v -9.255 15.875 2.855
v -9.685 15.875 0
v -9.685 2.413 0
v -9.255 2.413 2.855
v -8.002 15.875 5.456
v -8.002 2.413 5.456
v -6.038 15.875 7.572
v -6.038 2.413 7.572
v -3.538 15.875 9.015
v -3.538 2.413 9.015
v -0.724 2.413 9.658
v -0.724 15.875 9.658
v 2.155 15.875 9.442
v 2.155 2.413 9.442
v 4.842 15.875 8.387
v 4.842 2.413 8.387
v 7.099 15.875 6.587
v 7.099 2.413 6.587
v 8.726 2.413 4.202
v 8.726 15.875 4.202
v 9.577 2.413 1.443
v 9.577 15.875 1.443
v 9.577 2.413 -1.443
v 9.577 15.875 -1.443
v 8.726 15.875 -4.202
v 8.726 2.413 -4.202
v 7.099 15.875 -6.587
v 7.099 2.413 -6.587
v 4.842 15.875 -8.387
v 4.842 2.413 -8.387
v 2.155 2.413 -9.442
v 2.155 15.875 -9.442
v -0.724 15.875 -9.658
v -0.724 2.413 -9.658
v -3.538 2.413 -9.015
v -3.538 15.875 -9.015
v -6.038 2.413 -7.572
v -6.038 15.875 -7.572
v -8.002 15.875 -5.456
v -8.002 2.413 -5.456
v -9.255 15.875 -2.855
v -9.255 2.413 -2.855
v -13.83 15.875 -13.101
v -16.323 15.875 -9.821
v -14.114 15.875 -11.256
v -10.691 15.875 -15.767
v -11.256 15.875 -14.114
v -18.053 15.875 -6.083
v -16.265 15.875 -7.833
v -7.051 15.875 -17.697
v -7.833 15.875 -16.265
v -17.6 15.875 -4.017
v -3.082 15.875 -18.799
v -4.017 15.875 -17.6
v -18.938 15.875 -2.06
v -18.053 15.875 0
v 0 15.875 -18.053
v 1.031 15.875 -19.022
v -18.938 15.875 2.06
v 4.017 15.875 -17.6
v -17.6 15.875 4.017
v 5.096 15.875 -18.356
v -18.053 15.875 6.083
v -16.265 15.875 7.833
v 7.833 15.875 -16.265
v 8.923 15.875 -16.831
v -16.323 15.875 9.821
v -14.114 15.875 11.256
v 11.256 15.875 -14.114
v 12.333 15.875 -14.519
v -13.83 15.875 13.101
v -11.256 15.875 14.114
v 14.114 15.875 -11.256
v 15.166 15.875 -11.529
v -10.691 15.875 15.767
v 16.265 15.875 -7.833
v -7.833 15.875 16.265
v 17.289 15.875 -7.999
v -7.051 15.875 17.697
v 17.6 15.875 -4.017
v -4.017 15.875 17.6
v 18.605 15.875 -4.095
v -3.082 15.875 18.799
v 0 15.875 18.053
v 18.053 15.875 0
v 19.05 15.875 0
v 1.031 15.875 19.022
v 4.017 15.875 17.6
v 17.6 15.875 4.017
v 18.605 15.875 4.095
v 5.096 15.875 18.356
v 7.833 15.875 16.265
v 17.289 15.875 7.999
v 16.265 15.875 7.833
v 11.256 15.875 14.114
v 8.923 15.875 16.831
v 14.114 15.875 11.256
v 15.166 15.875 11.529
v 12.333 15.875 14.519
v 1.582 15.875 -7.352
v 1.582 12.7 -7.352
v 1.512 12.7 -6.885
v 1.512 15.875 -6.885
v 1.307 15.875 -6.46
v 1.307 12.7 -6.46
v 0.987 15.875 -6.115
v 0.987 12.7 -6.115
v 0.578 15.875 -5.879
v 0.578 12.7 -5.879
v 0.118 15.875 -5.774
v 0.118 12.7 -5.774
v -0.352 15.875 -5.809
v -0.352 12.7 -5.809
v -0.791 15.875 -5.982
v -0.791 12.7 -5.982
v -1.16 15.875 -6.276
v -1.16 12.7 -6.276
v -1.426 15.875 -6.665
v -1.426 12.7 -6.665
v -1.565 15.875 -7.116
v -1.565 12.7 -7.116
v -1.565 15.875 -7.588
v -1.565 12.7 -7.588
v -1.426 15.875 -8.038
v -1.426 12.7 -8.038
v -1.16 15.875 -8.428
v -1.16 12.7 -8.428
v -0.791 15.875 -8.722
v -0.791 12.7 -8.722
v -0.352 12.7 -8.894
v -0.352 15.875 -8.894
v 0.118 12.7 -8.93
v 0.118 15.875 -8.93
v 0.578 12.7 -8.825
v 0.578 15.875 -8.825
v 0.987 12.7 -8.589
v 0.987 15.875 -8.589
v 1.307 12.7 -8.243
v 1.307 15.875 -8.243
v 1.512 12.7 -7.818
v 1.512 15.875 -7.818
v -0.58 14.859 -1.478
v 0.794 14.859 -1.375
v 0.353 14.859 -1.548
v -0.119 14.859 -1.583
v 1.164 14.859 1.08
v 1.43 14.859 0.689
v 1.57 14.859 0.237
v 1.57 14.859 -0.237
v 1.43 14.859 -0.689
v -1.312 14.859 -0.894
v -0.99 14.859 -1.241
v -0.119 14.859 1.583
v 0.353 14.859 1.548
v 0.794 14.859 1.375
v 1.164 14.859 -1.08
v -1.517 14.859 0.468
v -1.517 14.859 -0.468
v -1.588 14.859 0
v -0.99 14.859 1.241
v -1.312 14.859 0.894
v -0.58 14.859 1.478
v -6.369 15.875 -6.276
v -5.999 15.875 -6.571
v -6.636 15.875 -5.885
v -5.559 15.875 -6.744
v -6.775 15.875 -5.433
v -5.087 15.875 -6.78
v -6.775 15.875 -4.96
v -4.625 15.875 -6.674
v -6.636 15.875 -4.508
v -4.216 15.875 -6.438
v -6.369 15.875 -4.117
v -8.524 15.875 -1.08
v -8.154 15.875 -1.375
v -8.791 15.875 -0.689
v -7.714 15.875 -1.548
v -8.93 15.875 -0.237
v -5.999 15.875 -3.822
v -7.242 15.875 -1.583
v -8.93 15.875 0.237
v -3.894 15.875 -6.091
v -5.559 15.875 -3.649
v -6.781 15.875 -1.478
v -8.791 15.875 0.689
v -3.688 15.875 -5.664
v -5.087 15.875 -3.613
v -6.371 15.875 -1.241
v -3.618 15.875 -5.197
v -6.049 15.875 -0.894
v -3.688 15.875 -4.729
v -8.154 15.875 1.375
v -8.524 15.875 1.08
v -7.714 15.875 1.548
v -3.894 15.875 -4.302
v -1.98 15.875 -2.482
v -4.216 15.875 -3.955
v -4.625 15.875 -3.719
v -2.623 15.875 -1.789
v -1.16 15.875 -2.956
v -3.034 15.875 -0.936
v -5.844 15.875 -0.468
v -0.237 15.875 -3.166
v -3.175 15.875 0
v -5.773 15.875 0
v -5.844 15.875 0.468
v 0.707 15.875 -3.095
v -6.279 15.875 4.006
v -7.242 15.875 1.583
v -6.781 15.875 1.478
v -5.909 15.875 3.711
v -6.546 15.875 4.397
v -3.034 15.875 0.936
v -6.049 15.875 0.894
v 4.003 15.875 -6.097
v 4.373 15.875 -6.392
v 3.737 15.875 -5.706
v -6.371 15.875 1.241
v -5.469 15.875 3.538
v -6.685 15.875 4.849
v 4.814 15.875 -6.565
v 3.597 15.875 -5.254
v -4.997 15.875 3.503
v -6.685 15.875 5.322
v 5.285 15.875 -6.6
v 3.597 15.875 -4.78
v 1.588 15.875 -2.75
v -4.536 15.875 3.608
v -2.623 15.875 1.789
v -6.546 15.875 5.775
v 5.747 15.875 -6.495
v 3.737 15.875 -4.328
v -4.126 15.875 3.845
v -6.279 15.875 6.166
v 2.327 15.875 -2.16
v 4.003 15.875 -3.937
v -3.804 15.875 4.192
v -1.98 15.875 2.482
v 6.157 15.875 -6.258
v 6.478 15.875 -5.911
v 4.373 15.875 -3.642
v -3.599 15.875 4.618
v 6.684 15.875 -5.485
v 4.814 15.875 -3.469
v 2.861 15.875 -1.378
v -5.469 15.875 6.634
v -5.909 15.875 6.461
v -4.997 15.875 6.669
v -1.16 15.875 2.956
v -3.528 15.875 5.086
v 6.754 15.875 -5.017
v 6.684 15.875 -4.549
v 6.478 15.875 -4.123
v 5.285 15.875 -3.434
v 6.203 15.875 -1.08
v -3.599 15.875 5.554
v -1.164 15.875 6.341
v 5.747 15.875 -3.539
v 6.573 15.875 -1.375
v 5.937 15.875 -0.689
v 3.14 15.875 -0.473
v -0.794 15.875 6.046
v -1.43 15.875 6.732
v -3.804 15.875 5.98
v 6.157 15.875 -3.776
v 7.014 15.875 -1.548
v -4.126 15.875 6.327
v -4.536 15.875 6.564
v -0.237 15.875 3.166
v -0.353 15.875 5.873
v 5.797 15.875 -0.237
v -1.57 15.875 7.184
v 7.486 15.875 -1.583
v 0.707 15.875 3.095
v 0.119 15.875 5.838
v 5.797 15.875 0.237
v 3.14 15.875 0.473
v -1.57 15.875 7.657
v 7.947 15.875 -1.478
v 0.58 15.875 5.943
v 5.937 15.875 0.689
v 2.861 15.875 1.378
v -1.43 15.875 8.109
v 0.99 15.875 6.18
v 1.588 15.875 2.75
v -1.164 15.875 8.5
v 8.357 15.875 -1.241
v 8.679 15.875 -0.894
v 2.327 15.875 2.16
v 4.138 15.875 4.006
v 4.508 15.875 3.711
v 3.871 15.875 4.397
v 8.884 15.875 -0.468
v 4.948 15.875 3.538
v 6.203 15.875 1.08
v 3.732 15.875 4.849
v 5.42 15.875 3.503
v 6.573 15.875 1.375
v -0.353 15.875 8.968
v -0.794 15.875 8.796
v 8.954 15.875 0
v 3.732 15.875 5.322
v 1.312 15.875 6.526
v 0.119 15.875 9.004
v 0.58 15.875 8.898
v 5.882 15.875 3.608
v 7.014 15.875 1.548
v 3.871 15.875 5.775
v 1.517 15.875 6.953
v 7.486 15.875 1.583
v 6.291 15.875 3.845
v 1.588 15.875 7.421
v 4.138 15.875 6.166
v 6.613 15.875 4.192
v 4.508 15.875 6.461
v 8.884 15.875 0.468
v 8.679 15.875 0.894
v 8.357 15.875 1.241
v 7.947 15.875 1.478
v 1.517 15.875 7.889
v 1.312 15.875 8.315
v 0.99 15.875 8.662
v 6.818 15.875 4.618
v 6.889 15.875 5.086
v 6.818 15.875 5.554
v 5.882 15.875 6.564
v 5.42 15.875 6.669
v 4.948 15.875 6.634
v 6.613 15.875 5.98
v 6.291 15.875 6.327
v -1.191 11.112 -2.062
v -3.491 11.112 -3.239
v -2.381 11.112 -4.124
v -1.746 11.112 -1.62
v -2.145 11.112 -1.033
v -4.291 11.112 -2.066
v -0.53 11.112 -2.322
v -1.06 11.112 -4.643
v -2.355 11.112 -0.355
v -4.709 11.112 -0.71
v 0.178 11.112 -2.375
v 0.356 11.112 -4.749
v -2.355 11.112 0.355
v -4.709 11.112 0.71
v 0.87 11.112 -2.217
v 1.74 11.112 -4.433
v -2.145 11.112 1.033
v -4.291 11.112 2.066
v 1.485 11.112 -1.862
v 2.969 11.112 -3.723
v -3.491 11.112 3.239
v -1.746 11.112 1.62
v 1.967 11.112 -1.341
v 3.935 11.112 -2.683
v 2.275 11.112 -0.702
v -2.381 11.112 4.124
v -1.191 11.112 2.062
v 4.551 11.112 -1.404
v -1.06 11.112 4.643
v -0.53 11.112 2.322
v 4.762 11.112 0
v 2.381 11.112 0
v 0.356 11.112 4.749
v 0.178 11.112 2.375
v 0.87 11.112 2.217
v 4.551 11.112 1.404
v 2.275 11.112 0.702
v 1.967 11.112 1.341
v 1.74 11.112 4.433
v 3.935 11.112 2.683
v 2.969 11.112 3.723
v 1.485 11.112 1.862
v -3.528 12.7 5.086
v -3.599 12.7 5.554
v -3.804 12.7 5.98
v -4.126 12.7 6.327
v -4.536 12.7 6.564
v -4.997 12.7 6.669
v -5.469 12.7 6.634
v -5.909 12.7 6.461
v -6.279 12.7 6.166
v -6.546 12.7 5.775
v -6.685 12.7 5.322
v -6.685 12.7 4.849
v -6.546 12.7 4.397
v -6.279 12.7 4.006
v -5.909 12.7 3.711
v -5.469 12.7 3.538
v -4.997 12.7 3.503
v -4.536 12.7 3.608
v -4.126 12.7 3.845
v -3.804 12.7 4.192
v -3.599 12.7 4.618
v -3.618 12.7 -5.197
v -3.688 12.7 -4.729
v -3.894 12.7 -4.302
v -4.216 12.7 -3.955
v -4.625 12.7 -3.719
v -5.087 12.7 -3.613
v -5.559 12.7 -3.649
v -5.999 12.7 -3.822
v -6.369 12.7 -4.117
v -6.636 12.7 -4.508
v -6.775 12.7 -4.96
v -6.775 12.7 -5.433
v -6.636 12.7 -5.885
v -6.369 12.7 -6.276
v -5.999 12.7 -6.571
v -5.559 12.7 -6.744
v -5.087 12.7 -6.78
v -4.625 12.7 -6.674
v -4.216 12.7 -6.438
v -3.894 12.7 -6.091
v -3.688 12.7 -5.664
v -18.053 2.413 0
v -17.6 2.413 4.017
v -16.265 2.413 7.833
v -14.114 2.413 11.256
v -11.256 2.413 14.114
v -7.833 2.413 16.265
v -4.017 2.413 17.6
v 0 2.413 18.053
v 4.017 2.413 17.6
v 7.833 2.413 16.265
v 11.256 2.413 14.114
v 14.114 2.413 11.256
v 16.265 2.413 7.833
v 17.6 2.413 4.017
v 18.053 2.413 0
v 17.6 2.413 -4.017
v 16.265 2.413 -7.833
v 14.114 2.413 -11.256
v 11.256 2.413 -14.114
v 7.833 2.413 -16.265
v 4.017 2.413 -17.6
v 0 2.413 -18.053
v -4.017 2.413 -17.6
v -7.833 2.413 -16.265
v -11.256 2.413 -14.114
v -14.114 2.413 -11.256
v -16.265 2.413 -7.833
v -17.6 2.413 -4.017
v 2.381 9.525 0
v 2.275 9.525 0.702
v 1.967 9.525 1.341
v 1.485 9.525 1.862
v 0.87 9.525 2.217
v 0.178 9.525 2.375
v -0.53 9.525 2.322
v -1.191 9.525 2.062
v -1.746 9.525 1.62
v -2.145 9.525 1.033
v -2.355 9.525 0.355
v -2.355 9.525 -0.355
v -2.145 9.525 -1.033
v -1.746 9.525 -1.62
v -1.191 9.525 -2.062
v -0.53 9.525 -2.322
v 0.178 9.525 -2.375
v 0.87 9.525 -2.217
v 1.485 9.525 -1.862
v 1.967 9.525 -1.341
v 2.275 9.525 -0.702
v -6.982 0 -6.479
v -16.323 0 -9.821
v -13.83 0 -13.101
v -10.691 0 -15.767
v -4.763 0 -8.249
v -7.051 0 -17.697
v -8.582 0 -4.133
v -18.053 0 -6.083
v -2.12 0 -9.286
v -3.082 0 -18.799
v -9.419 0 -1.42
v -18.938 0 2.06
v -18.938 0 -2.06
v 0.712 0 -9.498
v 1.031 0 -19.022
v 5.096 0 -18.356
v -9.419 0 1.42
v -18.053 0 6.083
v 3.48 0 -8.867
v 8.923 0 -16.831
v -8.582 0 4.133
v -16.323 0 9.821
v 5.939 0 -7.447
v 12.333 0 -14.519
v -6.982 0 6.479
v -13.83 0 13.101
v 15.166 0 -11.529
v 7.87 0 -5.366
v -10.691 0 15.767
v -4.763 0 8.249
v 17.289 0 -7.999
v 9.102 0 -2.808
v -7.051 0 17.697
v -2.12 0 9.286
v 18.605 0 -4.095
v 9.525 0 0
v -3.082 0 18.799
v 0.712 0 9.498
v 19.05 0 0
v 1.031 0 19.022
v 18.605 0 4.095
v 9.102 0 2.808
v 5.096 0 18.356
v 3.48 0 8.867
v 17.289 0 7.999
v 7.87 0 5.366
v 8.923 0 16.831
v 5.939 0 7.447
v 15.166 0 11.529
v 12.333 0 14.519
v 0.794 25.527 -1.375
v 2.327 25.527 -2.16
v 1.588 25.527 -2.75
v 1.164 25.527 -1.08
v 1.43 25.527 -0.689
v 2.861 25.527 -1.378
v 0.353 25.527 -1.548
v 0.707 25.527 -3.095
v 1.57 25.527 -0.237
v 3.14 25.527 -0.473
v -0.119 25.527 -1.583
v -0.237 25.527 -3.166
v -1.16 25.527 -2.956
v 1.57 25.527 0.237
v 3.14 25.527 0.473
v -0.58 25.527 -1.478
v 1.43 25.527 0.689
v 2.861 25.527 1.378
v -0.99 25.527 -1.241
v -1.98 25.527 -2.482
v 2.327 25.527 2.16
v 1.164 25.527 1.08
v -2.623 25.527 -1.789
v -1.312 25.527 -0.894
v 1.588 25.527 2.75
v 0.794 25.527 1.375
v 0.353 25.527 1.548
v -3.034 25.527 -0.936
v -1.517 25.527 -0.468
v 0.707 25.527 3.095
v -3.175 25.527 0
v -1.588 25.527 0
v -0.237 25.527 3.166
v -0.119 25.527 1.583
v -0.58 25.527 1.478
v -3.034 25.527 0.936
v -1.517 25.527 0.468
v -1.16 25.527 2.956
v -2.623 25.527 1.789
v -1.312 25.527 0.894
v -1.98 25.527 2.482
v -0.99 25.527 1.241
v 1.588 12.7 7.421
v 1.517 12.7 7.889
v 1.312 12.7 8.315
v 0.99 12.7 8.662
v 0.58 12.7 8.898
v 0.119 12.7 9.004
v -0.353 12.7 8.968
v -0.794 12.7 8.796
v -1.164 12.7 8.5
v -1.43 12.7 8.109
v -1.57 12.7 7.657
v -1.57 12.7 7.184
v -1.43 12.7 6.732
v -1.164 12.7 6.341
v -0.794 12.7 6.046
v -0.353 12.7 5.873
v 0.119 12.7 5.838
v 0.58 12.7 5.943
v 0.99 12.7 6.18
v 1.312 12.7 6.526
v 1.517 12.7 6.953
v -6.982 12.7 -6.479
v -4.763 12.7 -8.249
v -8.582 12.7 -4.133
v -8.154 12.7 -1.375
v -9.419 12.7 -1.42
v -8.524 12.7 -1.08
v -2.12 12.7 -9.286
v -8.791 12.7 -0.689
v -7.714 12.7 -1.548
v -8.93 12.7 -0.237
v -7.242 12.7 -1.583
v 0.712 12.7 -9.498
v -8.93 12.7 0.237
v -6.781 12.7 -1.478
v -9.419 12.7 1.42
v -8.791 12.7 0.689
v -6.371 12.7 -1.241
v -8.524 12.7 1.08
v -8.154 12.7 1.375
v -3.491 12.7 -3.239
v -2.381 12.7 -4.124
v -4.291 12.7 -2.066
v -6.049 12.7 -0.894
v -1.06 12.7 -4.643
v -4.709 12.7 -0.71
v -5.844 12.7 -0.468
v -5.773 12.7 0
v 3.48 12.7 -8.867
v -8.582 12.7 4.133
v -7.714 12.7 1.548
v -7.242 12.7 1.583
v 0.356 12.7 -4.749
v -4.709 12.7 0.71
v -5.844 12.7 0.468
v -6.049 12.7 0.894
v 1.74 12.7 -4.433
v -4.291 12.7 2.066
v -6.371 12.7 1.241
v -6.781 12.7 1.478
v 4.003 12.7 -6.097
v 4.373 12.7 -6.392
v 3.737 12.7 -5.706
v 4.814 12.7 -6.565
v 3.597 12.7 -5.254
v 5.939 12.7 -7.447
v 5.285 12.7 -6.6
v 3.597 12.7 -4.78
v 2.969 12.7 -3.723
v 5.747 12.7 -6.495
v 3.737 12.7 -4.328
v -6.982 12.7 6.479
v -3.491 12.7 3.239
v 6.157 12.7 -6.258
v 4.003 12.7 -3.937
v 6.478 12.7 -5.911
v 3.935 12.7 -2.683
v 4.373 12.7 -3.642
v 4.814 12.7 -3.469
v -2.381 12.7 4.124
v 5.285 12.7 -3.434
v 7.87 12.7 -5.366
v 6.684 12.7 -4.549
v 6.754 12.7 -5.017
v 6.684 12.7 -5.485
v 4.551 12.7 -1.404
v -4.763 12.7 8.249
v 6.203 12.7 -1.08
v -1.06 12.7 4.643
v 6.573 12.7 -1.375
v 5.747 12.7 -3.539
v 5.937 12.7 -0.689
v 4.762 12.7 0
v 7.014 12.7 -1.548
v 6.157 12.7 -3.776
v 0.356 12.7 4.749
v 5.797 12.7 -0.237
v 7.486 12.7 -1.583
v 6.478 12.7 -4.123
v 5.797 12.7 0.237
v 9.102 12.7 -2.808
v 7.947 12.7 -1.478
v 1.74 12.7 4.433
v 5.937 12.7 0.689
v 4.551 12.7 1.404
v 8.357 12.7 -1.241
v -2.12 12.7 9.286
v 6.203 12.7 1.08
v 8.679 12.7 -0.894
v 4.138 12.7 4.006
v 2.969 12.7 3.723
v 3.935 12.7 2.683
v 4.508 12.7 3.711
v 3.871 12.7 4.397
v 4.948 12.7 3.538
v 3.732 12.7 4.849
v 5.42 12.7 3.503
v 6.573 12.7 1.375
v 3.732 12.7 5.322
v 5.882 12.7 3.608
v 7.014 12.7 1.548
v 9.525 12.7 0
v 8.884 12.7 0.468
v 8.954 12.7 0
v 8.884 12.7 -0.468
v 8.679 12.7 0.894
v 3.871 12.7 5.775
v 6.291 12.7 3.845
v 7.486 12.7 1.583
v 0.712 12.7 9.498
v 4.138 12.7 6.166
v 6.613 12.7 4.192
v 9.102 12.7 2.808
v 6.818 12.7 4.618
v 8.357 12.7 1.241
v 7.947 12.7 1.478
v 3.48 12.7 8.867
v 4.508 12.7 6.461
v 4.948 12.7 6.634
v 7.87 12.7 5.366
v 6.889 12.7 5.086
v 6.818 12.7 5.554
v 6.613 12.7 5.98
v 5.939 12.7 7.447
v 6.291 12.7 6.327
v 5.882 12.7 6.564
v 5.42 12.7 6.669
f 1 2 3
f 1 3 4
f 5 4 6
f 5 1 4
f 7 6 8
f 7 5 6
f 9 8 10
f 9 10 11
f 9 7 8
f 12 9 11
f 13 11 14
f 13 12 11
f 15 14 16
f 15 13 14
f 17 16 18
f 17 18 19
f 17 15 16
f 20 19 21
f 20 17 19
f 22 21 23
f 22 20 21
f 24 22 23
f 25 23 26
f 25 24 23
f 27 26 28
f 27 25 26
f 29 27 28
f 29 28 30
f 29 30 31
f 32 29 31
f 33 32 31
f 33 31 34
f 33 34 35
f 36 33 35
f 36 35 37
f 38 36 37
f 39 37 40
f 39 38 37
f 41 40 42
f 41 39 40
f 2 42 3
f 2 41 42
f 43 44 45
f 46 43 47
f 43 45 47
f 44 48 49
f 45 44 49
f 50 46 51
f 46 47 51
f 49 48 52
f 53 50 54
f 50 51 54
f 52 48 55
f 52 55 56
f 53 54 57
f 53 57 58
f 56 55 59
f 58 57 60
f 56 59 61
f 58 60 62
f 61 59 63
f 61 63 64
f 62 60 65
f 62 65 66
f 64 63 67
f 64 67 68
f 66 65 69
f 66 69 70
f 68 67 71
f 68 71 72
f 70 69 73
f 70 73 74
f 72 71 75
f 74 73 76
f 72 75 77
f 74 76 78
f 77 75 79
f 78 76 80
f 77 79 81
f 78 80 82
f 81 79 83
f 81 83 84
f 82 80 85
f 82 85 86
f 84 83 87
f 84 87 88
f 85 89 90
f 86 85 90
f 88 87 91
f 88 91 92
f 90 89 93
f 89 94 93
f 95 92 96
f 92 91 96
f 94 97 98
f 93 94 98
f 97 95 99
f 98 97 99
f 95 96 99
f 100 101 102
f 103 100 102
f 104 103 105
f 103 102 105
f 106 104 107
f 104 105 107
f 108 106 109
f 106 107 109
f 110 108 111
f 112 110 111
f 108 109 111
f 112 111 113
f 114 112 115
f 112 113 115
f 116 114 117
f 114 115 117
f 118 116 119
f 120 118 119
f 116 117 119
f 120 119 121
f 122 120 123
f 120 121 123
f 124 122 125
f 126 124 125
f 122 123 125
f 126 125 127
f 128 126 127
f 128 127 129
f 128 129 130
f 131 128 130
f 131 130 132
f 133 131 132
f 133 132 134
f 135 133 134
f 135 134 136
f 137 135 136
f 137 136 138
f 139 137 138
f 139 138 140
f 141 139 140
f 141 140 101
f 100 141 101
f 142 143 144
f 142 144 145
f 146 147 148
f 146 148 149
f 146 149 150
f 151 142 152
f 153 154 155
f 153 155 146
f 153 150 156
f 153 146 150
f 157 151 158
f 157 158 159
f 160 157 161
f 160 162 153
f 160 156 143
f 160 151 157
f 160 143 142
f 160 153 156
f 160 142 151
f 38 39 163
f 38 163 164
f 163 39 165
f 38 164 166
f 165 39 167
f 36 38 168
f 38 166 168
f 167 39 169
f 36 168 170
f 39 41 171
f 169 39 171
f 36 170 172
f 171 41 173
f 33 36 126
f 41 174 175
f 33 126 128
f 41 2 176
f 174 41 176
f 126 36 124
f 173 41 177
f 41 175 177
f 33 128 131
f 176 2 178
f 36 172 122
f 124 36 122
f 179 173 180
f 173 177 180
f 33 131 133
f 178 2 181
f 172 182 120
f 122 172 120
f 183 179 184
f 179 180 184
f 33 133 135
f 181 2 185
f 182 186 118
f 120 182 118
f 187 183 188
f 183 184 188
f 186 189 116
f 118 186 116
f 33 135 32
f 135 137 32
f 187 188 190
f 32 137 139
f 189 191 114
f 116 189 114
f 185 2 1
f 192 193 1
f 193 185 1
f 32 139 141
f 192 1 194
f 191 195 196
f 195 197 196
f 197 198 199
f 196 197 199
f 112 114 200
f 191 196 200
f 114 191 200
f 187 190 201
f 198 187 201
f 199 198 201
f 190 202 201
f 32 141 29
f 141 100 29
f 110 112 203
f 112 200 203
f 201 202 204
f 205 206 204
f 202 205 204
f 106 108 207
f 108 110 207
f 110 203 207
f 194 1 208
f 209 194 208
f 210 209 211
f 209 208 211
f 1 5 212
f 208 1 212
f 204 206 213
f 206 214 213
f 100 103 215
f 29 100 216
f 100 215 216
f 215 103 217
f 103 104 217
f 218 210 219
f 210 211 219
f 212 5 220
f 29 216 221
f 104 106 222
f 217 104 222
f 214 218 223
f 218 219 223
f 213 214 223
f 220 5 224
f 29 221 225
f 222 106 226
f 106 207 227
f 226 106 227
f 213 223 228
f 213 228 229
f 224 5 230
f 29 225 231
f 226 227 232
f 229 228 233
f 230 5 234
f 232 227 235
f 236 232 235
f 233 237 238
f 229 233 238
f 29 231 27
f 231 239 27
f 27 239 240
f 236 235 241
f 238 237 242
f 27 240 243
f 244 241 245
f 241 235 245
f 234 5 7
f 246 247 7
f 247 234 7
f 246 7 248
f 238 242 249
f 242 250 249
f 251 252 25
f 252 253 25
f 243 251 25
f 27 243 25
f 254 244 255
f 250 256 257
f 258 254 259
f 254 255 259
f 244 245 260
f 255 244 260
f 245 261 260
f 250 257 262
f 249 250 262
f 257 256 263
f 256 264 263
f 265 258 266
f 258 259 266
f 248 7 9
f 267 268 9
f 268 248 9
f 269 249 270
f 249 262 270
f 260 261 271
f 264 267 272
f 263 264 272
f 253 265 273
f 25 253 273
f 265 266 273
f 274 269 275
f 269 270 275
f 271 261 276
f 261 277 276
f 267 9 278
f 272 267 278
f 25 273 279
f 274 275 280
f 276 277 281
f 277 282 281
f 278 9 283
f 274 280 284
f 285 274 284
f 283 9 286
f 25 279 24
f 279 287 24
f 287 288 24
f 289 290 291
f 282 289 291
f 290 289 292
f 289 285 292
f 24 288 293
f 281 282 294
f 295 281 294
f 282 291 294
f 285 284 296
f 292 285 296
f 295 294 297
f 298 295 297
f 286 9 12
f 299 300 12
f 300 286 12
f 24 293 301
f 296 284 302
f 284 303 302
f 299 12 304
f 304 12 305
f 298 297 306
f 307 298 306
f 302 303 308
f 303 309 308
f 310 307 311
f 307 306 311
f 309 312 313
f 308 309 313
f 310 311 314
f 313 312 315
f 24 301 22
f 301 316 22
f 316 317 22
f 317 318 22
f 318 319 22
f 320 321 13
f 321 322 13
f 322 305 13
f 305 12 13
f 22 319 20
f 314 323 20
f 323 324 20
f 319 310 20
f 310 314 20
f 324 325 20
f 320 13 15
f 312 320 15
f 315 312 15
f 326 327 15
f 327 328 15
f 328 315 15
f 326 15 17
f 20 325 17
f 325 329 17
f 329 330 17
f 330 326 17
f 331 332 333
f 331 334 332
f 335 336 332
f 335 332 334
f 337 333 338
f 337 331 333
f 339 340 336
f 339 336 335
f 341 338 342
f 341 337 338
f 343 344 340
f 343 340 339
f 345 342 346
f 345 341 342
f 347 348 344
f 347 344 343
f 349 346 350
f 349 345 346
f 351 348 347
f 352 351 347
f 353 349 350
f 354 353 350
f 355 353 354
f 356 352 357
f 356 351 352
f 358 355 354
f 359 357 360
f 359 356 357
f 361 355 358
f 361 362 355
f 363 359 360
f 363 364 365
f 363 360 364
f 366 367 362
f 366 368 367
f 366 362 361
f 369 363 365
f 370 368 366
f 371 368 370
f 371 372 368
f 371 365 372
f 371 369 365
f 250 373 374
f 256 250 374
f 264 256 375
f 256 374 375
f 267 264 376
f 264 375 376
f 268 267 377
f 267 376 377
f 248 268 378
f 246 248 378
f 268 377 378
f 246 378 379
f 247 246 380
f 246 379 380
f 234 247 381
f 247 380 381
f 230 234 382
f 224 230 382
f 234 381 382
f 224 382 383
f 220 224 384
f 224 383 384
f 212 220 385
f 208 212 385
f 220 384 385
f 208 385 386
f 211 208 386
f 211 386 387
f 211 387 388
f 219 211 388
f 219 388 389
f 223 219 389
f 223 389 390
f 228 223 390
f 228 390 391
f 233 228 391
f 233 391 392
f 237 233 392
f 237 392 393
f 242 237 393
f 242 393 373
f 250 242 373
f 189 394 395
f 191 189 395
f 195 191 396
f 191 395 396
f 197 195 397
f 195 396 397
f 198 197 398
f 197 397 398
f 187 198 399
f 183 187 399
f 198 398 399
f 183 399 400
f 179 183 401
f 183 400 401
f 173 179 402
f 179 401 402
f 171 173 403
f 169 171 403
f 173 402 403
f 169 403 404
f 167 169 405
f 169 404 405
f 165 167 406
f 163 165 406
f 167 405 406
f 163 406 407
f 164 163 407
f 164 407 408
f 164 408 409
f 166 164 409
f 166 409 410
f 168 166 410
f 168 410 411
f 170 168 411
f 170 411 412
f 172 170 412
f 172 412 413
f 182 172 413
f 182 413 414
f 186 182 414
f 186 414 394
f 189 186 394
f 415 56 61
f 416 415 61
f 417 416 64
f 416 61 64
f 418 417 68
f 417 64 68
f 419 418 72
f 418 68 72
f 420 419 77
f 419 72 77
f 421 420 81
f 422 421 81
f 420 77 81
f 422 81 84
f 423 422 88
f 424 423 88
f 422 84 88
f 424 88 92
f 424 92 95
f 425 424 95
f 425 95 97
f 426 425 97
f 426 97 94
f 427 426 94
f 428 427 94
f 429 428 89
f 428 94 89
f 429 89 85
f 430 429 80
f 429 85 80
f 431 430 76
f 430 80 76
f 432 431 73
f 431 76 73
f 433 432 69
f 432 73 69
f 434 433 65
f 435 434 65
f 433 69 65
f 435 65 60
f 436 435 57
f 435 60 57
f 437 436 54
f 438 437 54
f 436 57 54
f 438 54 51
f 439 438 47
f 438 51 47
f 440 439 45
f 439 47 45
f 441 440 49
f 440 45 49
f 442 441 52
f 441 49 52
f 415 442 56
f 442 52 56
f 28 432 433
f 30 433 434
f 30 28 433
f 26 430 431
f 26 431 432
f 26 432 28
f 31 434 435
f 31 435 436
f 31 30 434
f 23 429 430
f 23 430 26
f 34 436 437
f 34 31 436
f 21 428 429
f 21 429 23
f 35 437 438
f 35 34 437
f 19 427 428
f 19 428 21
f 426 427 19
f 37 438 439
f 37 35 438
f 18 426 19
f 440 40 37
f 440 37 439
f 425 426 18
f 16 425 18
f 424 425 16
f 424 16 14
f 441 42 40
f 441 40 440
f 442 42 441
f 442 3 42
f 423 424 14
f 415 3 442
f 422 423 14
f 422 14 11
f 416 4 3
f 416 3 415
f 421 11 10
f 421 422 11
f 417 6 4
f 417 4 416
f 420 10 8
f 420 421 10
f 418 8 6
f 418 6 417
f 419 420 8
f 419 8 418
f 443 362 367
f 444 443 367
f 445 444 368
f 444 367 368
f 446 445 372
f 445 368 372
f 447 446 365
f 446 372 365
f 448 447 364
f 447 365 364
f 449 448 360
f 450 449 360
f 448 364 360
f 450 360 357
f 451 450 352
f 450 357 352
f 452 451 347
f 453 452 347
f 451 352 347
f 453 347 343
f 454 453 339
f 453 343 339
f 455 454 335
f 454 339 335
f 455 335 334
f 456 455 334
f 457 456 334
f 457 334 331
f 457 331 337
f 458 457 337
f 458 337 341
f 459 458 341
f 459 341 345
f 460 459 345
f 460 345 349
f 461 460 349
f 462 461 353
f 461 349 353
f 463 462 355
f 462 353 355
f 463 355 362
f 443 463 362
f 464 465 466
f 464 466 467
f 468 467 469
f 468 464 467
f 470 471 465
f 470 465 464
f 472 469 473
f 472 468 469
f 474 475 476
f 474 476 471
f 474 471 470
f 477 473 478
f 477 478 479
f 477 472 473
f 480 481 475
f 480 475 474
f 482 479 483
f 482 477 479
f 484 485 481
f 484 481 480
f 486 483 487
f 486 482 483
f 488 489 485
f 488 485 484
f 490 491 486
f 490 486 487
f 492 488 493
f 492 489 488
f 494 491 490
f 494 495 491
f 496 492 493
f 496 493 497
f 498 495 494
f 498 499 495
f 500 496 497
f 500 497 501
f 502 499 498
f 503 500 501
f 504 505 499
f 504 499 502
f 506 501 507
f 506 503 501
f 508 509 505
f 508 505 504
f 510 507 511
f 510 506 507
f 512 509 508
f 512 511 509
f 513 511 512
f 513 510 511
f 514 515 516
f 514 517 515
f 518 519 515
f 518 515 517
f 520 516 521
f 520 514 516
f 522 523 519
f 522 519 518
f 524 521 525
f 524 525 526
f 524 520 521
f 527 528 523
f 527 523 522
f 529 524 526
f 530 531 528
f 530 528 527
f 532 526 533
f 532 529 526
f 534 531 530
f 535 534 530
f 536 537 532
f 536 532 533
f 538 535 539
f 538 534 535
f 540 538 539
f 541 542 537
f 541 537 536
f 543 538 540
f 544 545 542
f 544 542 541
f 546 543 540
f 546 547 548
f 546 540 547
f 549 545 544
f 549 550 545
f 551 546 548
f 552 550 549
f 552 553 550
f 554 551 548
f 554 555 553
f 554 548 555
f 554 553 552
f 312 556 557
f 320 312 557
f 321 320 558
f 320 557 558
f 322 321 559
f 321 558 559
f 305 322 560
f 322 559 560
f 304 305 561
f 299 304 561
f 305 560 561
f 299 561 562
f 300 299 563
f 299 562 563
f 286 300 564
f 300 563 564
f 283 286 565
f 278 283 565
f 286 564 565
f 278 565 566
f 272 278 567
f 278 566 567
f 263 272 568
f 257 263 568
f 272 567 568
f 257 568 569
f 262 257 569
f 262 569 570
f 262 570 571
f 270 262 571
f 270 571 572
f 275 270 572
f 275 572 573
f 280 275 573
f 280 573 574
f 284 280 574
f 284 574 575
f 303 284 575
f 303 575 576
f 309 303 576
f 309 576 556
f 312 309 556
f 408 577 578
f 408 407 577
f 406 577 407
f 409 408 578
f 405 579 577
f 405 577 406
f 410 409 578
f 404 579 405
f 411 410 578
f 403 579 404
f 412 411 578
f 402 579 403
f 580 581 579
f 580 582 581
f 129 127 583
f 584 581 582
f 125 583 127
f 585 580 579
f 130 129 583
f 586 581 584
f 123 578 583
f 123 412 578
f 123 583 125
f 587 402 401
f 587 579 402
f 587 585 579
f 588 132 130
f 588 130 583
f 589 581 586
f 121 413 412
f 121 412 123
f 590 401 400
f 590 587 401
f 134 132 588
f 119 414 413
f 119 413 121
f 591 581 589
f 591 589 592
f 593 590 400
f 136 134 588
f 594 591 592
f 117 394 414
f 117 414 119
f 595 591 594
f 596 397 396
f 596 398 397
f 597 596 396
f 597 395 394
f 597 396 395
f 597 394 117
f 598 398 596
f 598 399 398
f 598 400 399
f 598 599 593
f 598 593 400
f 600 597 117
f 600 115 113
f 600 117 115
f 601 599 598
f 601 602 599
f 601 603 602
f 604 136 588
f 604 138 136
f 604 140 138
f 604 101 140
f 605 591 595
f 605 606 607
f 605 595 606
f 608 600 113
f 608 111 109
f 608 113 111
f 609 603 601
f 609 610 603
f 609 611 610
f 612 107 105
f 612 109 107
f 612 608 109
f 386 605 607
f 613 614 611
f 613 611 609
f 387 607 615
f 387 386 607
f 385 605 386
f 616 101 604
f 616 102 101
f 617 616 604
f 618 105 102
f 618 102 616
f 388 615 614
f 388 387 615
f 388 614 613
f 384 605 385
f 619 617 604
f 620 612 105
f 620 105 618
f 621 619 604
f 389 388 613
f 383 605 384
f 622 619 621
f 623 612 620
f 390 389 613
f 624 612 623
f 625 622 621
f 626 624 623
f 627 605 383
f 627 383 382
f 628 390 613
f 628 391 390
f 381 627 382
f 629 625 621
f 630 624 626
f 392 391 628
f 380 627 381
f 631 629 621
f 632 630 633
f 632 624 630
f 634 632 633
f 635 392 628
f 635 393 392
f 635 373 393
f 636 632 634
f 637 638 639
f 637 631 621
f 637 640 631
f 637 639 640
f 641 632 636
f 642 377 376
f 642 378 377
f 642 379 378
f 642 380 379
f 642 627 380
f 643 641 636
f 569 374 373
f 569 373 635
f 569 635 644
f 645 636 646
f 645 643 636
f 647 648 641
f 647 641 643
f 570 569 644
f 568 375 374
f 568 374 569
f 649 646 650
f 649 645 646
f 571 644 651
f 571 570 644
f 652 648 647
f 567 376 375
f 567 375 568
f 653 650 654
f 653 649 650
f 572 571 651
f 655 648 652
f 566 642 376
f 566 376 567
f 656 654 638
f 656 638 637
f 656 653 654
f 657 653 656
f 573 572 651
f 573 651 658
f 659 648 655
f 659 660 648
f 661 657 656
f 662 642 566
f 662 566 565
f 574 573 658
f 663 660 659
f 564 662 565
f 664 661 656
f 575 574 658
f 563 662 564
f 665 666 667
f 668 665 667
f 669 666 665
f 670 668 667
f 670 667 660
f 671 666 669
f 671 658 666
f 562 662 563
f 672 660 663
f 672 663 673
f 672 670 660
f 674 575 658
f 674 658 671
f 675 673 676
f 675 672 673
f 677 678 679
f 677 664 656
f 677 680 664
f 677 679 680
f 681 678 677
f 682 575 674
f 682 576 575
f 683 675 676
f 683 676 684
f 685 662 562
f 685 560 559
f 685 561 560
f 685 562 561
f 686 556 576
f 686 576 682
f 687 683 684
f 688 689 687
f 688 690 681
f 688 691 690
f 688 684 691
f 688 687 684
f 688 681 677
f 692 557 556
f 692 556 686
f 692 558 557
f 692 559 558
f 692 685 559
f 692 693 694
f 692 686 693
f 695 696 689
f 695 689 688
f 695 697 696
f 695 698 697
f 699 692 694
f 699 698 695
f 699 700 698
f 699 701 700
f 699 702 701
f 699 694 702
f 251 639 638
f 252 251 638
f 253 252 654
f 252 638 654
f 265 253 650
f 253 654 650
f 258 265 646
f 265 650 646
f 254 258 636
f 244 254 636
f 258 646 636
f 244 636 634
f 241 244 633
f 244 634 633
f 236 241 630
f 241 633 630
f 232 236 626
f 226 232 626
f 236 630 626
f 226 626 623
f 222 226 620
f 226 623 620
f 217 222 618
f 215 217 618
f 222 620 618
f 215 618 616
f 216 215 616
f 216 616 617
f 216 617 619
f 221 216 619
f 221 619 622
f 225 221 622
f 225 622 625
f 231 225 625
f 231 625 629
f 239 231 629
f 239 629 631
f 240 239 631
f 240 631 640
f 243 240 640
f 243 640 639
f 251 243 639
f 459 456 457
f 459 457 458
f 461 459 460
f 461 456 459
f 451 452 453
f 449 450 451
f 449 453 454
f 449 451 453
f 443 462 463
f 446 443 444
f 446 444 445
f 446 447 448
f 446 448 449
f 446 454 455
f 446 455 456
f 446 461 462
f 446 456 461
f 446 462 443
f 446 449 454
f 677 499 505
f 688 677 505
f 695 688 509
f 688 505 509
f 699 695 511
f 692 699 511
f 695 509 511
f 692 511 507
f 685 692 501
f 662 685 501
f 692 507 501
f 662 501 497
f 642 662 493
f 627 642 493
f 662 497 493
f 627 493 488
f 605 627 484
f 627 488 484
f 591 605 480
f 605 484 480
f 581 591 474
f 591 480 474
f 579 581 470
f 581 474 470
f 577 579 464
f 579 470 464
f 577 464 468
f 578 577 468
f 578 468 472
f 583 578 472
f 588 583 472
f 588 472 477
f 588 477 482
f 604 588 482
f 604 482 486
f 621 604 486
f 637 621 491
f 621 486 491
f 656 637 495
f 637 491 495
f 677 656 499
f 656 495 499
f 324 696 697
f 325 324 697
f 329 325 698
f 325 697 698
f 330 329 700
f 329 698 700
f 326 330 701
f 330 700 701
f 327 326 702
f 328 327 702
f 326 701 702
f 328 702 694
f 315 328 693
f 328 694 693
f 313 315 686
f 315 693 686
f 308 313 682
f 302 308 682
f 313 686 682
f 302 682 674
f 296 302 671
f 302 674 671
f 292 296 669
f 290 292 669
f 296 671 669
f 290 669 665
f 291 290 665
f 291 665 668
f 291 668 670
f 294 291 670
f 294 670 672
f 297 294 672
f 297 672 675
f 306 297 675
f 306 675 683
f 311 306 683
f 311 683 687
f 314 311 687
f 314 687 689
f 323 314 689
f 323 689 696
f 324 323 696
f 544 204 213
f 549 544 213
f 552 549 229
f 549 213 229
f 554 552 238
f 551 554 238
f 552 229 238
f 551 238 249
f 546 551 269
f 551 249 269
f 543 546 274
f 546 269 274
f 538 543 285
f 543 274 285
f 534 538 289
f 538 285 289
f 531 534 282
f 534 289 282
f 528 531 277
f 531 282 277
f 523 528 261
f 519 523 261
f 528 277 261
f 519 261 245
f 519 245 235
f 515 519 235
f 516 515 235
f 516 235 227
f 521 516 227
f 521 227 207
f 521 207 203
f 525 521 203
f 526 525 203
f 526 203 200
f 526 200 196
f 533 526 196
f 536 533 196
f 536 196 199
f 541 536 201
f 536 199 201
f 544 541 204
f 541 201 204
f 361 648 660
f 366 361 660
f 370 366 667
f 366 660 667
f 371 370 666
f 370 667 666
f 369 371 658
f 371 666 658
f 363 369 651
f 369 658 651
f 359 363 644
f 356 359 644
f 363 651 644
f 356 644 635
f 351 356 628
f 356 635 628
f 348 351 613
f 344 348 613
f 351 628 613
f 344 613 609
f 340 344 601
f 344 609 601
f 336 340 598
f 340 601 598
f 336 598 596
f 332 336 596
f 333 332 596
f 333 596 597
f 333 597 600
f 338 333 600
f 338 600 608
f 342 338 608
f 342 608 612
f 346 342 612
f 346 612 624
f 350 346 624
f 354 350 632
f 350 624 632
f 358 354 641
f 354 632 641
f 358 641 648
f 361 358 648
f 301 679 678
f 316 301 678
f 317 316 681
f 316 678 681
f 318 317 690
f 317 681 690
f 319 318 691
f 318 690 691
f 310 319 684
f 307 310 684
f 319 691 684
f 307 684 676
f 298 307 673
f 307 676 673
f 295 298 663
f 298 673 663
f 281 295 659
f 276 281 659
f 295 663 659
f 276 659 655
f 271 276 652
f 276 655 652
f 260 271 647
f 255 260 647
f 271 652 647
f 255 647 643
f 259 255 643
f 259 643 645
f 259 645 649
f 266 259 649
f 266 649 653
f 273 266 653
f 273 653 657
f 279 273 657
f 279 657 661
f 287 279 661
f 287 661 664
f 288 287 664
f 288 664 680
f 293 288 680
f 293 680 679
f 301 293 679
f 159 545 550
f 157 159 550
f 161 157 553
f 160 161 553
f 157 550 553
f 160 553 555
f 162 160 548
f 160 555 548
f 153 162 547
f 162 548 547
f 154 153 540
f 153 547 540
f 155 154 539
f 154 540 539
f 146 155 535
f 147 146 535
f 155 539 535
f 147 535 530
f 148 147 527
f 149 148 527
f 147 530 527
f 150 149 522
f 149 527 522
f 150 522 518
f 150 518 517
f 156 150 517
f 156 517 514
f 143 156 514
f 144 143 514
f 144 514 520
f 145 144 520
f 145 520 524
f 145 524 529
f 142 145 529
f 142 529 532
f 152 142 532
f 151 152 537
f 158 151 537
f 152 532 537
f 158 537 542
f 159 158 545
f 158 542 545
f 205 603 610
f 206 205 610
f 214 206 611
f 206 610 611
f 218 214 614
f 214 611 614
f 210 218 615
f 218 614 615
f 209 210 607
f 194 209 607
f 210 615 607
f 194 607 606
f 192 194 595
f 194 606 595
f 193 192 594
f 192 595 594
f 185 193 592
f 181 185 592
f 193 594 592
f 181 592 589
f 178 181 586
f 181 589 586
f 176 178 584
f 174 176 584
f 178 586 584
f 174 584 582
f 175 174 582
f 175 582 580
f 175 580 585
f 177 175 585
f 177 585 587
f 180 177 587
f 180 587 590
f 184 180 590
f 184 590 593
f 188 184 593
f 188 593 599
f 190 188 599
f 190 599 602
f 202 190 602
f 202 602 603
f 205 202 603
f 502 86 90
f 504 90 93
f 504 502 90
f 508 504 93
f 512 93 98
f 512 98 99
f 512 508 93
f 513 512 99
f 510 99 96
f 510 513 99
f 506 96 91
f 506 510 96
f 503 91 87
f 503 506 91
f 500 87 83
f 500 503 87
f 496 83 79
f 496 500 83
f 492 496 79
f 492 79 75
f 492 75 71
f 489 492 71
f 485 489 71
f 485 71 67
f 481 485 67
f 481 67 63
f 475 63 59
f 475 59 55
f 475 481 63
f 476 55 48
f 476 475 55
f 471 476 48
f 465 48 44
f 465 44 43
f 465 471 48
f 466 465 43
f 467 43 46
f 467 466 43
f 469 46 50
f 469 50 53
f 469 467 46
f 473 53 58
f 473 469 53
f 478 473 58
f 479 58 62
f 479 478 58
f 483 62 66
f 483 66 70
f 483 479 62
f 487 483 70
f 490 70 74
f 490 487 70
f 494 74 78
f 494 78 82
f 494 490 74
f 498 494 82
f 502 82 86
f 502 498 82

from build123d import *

# Parameters (mm, degrees)
F0_R      = 19.05
F1_DEPTH  = 15.875
F2_R      = 9.525
F3_DEPTH  = 12.7
F5_R      = 1.5875
F6_DEPTH  = 25.4
F7_R      = 1.582292
F8_DEPTH  = 25.4
F9_R      = 1.5875
F10_DEPTH = 25.4
F11_R     = 1.5875
F12_DEPTH = 25.4
F13_R     = 1.5875
F14_DEPTH = 25.4
F15_R     = 1.5875
F16_DEPTH = 25.4
F17_R     = 1.5875
F18_DEPTH = 25.4
F19_R     = 1.5875
F20_DEPTH = 25.4
F21_R     = 4.7625
F22_DEPTH = 1.5875
F23_R     = 2.38125
F24_DEPTH = 1.5875
F26_R     = 18.052575
F26_R_2   = 9.68479
F27_DEPTH = 13.462
F28_R     = 3.175
F29_DEPTH = 9.652
F30_R     = 1.5875
F31_DEPTH = 10.668


with BuildPart() as f1:
    # F0 (on Front) → F1 (new body)
    with BuildSketch(Plane.XZ):
        Circle(F0_R)
    extrude(amount=-F1_DEPTH)

    # F2 (on face) → F3 (cut)
    with BuildSketch(Plane.XZ):
        Circle(F2_R)
    extrude(amount=-F3_DEPTH, mode=Mode.SUBTRACT)

    # F5 (on face) → F6 (cut)
    with BuildSketch(Plane.XZ.offset(-12.7)):
        with Locations((0, 7.420709)):
            Circle(F5_R)
    extrude(amount=-F6_DEPTH, mode=Mode.SUBTRACT)

    # F7 (on face) → F8 (cut)
    with BuildSketch(Plane.XZ.offset(-12.7)):
        with Locations((0, -7.351812)):
            Circle(F7_R)
    extrude(amount=-F8_DEPTH, mode=Mode.SUBTRACT)

    # F9 (on face) → F10 (cut)
    with BuildSketch(Plane.XZ.offset(-12.7)):
        with Locations((-7.360636, 0)):
            Circle(F9_R)
    extrude(amount=-F10_DEPTH, mode=Mode.SUBTRACT)

    # F11 (on face) → F12 (cut)
    with BuildSketch(Plane.XZ.offset(-12.7)):
        with Locations((7.366985, 0)):
            Circle(F11_R)
    extrude(amount=-F12_DEPTH, mode=Mode.SUBTRACT)

    # F13 (on face) → F14 (cut)
    with BuildSketch(Plane.XZ.offset(-12.7)):
        with Locations((-5.115572, 5.085843)):
            Circle(F13_R)
    extrude(amount=-F14_DEPTH, mode=Mode.SUBTRACT)

    # F15 (on face) → F16 (cut)
    with BuildSketch(Plane.XZ.offset(-12.7)):
        with Locations((5.301525, 5.085843)):
            Circle(F15_R)
    extrude(amount=-F16_DEPTH, mode=Mode.SUBTRACT)

    # F17 (on face) → F18 (cut)
    with BuildSketch(Plane.XZ.offset(-12.7)):
        with Locations((-5.205374, -5.196551)):
            Circle(F17_R)
    extrude(amount=-F18_DEPTH, mode=Mode.SUBTRACT)

    # F19 (on face) → F20 (cut)
    with BuildSketch(Plane.XZ.offset(-12.7)):
        with Locations((5.166822, -5.016946)):
            Circle(F19_R)
    extrude(amount=-F20_DEPTH, mode=Mode.SUBTRACT)

    # F21 (on face) → F22 (join)
    with BuildSketch(Plane.XZ.offset(-12.7)):
        Circle(F21_R)
    extrude(amount=F22_DEPTH)

    # F23 (on face) → F24 (join)
    with BuildSketch(Plane.XZ.offset(-11.1125)):
        Circle(F23_R)
    extrude(amount=F24_DEPTH)

    # F26 (on face) → F27 (cut)
    with BuildSketch(Plane(origin=(0, 15.875, 0), x_dir=(-1, 0, 0), z_dir=(0, 1, 0))):
        Circle(F26_R)
        Circle(F26_R_2, mode=Mode.SUBTRACT)
    extrude(amount=-F27_DEPTH, mode=Mode.SUBTRACT)

    # F28 (on face) → F29 (join)
    with BuildSketch(Plane(origin=(0, 15.875, 0), x_dir=(-1, 0, 0), z_dir=(0, 1, 0))):
        Circle(F28_R)
    extrude(amount=F29_DEPTH)

    # F30 (on face) → F31 (cut)
    with BuildSketch(Plane(origin=(0, 25.527, 0), x_dir=(-1, 0, 0), z_dir=(0, 1, 0))):
        Circle(F30_R)
    extrude(amount=-F31_DEPTH, mode=Mode.SUBTRACT)


solid = f1.part
